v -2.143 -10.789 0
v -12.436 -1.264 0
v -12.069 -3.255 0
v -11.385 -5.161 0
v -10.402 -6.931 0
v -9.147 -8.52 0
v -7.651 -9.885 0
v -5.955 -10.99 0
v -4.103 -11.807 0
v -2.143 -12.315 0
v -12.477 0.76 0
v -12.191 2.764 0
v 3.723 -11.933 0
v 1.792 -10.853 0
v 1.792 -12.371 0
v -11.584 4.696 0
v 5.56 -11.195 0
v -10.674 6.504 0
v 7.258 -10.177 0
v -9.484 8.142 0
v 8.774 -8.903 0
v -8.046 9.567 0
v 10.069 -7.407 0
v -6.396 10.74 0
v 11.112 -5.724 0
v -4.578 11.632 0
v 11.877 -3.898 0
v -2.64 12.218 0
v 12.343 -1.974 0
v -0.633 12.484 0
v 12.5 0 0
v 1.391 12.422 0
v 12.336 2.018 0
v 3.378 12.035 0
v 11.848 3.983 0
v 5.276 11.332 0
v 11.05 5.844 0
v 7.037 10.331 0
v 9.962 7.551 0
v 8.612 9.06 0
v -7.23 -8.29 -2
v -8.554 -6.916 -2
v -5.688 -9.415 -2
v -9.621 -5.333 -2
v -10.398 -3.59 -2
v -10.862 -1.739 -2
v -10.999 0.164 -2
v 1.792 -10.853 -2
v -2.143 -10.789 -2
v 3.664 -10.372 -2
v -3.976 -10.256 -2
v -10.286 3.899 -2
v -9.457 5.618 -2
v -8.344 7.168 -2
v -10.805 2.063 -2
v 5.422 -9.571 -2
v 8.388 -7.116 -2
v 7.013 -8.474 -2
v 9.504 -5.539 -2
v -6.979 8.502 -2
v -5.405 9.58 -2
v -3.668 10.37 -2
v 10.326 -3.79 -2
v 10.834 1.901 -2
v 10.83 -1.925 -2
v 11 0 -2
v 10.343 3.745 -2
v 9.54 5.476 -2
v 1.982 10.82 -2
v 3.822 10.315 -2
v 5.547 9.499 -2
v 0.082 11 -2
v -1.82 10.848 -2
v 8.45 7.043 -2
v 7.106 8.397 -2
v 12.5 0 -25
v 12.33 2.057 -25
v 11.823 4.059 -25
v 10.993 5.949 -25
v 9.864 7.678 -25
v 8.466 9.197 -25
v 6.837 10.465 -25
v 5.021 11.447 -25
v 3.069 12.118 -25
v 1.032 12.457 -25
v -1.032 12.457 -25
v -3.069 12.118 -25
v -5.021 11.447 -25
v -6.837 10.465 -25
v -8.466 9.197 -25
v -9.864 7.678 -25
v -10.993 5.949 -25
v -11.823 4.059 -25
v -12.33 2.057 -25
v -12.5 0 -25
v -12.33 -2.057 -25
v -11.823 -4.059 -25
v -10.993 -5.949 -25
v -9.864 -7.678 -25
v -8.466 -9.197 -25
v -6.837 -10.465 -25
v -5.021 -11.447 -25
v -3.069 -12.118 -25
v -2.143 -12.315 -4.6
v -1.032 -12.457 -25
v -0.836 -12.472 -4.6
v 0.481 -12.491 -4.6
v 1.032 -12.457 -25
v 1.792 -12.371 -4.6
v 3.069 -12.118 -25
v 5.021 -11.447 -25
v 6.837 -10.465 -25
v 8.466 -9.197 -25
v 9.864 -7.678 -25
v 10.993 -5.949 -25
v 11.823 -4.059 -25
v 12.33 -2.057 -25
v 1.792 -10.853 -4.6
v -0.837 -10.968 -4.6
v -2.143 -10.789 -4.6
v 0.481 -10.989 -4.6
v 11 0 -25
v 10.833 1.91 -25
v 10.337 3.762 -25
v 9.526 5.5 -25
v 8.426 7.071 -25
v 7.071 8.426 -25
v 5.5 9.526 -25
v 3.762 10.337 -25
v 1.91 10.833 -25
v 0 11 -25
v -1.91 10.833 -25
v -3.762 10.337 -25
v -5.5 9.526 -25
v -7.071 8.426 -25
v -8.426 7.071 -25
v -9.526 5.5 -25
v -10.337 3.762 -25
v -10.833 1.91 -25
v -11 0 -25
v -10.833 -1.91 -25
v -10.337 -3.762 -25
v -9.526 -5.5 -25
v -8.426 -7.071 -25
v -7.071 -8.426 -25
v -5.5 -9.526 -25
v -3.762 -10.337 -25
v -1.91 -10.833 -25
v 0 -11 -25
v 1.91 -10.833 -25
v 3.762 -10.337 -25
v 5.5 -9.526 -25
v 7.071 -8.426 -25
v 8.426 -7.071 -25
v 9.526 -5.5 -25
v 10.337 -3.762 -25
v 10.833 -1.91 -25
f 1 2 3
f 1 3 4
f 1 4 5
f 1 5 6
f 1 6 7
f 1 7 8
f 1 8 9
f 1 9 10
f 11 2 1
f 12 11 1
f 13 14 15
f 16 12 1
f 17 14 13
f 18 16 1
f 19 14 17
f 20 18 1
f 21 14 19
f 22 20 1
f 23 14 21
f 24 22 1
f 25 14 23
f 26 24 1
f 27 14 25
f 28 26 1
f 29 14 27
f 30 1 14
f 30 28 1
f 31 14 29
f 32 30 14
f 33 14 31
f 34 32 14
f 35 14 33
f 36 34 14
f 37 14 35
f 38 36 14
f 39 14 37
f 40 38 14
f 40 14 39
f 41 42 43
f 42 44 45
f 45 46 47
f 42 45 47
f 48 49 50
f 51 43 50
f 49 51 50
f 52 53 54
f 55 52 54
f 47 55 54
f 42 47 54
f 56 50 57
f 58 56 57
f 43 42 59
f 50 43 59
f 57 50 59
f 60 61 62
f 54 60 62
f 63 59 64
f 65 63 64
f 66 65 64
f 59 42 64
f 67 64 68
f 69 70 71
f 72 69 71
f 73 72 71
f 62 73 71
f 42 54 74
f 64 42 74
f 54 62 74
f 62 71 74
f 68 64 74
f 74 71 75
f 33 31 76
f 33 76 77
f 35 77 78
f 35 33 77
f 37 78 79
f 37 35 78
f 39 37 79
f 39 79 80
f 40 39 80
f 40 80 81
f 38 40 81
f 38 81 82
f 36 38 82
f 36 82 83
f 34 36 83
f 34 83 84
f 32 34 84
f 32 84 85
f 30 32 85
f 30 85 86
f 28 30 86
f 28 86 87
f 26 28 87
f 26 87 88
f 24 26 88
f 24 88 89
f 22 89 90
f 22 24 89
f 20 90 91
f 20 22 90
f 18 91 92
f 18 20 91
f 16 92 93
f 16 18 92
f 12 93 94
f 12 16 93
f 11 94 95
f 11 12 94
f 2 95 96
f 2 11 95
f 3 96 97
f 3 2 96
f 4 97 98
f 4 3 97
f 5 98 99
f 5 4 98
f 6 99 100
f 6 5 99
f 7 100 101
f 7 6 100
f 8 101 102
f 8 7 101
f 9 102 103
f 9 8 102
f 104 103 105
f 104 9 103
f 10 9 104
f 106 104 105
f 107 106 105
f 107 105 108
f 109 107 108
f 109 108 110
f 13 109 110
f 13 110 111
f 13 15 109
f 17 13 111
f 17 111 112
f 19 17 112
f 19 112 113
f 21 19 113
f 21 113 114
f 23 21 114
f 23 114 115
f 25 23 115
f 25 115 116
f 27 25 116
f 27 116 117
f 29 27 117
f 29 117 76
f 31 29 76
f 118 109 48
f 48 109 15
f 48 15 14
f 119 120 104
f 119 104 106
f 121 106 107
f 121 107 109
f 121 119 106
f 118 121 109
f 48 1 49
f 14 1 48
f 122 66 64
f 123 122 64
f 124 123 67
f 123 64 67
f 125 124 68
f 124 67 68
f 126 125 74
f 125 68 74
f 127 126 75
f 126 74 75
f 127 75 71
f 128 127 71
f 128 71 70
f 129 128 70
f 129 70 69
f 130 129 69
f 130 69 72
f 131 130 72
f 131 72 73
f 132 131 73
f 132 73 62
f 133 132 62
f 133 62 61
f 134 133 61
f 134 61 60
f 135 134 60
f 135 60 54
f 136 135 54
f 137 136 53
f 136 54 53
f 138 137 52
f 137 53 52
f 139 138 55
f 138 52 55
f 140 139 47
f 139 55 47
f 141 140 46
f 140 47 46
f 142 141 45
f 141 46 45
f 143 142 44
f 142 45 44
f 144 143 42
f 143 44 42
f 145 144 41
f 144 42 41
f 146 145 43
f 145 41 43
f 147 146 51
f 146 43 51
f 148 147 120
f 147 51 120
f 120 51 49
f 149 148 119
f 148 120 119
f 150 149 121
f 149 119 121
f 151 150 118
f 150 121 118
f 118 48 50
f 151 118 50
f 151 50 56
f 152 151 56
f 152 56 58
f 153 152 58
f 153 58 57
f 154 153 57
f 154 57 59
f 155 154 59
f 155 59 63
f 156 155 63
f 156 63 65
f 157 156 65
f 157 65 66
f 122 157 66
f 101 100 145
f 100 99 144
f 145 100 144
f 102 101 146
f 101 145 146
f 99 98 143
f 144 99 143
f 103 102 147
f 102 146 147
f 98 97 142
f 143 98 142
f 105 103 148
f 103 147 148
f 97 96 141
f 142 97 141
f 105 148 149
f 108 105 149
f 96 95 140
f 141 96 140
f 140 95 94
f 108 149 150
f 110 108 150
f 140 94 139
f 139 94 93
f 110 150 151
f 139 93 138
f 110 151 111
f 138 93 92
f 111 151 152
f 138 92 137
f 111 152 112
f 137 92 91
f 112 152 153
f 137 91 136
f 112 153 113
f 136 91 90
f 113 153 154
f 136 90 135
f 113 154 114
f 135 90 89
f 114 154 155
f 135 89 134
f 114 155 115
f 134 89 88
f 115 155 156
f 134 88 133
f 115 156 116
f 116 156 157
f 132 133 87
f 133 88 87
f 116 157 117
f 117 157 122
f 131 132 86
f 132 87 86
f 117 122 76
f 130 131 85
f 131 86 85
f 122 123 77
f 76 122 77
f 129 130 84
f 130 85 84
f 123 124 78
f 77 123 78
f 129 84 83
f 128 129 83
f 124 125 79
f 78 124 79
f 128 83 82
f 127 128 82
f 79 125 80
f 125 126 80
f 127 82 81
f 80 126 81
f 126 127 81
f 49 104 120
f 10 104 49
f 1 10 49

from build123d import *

# Parameters (mm, degrees)
F0_R     = 12.5
F0_R_2   = 11
F1_DEPTH = 25
F3_W     = 3.9352367166
F3_H     = 6.3360165805
F4_DEPTH = 4.6
F6_DEPTH = 2


with BuildPart() as f1:
    # F0 (on Top) → F1 (new body)
    with BuildSketch(Plane.XY):
        Circle(F0_R)
        Circle(F0_R_2, mode=Mode.SUBTRACT)
    extrude(amount=-F1_DEPTH)

    # F3 (on Top) → F4 (cut)
    with BuildSketch(Plane.XY):
        with Locations((-0.1754433615, -12.4150682241)):
            Rectangle(F3_W, F3_H)
    extrude(amount=-F4_DEPTH, mode=Mode.SUBTRACT)

    # F5 (on face) → F6 (join)
    with BuildSketch(Plane.XY):
        with BuildLine():
            Line((-2.1430617198, -10.7892208461), (1.7921749968, -10.853023025))
            ThreePointArc((1.7921749968, -10.853023025), (0.1783200847, 10.998554539), (-2.1430617198, -10.7892208461))
        make_face()
    extrude(amount=-F6_DEPTH)


solid = f1.part
